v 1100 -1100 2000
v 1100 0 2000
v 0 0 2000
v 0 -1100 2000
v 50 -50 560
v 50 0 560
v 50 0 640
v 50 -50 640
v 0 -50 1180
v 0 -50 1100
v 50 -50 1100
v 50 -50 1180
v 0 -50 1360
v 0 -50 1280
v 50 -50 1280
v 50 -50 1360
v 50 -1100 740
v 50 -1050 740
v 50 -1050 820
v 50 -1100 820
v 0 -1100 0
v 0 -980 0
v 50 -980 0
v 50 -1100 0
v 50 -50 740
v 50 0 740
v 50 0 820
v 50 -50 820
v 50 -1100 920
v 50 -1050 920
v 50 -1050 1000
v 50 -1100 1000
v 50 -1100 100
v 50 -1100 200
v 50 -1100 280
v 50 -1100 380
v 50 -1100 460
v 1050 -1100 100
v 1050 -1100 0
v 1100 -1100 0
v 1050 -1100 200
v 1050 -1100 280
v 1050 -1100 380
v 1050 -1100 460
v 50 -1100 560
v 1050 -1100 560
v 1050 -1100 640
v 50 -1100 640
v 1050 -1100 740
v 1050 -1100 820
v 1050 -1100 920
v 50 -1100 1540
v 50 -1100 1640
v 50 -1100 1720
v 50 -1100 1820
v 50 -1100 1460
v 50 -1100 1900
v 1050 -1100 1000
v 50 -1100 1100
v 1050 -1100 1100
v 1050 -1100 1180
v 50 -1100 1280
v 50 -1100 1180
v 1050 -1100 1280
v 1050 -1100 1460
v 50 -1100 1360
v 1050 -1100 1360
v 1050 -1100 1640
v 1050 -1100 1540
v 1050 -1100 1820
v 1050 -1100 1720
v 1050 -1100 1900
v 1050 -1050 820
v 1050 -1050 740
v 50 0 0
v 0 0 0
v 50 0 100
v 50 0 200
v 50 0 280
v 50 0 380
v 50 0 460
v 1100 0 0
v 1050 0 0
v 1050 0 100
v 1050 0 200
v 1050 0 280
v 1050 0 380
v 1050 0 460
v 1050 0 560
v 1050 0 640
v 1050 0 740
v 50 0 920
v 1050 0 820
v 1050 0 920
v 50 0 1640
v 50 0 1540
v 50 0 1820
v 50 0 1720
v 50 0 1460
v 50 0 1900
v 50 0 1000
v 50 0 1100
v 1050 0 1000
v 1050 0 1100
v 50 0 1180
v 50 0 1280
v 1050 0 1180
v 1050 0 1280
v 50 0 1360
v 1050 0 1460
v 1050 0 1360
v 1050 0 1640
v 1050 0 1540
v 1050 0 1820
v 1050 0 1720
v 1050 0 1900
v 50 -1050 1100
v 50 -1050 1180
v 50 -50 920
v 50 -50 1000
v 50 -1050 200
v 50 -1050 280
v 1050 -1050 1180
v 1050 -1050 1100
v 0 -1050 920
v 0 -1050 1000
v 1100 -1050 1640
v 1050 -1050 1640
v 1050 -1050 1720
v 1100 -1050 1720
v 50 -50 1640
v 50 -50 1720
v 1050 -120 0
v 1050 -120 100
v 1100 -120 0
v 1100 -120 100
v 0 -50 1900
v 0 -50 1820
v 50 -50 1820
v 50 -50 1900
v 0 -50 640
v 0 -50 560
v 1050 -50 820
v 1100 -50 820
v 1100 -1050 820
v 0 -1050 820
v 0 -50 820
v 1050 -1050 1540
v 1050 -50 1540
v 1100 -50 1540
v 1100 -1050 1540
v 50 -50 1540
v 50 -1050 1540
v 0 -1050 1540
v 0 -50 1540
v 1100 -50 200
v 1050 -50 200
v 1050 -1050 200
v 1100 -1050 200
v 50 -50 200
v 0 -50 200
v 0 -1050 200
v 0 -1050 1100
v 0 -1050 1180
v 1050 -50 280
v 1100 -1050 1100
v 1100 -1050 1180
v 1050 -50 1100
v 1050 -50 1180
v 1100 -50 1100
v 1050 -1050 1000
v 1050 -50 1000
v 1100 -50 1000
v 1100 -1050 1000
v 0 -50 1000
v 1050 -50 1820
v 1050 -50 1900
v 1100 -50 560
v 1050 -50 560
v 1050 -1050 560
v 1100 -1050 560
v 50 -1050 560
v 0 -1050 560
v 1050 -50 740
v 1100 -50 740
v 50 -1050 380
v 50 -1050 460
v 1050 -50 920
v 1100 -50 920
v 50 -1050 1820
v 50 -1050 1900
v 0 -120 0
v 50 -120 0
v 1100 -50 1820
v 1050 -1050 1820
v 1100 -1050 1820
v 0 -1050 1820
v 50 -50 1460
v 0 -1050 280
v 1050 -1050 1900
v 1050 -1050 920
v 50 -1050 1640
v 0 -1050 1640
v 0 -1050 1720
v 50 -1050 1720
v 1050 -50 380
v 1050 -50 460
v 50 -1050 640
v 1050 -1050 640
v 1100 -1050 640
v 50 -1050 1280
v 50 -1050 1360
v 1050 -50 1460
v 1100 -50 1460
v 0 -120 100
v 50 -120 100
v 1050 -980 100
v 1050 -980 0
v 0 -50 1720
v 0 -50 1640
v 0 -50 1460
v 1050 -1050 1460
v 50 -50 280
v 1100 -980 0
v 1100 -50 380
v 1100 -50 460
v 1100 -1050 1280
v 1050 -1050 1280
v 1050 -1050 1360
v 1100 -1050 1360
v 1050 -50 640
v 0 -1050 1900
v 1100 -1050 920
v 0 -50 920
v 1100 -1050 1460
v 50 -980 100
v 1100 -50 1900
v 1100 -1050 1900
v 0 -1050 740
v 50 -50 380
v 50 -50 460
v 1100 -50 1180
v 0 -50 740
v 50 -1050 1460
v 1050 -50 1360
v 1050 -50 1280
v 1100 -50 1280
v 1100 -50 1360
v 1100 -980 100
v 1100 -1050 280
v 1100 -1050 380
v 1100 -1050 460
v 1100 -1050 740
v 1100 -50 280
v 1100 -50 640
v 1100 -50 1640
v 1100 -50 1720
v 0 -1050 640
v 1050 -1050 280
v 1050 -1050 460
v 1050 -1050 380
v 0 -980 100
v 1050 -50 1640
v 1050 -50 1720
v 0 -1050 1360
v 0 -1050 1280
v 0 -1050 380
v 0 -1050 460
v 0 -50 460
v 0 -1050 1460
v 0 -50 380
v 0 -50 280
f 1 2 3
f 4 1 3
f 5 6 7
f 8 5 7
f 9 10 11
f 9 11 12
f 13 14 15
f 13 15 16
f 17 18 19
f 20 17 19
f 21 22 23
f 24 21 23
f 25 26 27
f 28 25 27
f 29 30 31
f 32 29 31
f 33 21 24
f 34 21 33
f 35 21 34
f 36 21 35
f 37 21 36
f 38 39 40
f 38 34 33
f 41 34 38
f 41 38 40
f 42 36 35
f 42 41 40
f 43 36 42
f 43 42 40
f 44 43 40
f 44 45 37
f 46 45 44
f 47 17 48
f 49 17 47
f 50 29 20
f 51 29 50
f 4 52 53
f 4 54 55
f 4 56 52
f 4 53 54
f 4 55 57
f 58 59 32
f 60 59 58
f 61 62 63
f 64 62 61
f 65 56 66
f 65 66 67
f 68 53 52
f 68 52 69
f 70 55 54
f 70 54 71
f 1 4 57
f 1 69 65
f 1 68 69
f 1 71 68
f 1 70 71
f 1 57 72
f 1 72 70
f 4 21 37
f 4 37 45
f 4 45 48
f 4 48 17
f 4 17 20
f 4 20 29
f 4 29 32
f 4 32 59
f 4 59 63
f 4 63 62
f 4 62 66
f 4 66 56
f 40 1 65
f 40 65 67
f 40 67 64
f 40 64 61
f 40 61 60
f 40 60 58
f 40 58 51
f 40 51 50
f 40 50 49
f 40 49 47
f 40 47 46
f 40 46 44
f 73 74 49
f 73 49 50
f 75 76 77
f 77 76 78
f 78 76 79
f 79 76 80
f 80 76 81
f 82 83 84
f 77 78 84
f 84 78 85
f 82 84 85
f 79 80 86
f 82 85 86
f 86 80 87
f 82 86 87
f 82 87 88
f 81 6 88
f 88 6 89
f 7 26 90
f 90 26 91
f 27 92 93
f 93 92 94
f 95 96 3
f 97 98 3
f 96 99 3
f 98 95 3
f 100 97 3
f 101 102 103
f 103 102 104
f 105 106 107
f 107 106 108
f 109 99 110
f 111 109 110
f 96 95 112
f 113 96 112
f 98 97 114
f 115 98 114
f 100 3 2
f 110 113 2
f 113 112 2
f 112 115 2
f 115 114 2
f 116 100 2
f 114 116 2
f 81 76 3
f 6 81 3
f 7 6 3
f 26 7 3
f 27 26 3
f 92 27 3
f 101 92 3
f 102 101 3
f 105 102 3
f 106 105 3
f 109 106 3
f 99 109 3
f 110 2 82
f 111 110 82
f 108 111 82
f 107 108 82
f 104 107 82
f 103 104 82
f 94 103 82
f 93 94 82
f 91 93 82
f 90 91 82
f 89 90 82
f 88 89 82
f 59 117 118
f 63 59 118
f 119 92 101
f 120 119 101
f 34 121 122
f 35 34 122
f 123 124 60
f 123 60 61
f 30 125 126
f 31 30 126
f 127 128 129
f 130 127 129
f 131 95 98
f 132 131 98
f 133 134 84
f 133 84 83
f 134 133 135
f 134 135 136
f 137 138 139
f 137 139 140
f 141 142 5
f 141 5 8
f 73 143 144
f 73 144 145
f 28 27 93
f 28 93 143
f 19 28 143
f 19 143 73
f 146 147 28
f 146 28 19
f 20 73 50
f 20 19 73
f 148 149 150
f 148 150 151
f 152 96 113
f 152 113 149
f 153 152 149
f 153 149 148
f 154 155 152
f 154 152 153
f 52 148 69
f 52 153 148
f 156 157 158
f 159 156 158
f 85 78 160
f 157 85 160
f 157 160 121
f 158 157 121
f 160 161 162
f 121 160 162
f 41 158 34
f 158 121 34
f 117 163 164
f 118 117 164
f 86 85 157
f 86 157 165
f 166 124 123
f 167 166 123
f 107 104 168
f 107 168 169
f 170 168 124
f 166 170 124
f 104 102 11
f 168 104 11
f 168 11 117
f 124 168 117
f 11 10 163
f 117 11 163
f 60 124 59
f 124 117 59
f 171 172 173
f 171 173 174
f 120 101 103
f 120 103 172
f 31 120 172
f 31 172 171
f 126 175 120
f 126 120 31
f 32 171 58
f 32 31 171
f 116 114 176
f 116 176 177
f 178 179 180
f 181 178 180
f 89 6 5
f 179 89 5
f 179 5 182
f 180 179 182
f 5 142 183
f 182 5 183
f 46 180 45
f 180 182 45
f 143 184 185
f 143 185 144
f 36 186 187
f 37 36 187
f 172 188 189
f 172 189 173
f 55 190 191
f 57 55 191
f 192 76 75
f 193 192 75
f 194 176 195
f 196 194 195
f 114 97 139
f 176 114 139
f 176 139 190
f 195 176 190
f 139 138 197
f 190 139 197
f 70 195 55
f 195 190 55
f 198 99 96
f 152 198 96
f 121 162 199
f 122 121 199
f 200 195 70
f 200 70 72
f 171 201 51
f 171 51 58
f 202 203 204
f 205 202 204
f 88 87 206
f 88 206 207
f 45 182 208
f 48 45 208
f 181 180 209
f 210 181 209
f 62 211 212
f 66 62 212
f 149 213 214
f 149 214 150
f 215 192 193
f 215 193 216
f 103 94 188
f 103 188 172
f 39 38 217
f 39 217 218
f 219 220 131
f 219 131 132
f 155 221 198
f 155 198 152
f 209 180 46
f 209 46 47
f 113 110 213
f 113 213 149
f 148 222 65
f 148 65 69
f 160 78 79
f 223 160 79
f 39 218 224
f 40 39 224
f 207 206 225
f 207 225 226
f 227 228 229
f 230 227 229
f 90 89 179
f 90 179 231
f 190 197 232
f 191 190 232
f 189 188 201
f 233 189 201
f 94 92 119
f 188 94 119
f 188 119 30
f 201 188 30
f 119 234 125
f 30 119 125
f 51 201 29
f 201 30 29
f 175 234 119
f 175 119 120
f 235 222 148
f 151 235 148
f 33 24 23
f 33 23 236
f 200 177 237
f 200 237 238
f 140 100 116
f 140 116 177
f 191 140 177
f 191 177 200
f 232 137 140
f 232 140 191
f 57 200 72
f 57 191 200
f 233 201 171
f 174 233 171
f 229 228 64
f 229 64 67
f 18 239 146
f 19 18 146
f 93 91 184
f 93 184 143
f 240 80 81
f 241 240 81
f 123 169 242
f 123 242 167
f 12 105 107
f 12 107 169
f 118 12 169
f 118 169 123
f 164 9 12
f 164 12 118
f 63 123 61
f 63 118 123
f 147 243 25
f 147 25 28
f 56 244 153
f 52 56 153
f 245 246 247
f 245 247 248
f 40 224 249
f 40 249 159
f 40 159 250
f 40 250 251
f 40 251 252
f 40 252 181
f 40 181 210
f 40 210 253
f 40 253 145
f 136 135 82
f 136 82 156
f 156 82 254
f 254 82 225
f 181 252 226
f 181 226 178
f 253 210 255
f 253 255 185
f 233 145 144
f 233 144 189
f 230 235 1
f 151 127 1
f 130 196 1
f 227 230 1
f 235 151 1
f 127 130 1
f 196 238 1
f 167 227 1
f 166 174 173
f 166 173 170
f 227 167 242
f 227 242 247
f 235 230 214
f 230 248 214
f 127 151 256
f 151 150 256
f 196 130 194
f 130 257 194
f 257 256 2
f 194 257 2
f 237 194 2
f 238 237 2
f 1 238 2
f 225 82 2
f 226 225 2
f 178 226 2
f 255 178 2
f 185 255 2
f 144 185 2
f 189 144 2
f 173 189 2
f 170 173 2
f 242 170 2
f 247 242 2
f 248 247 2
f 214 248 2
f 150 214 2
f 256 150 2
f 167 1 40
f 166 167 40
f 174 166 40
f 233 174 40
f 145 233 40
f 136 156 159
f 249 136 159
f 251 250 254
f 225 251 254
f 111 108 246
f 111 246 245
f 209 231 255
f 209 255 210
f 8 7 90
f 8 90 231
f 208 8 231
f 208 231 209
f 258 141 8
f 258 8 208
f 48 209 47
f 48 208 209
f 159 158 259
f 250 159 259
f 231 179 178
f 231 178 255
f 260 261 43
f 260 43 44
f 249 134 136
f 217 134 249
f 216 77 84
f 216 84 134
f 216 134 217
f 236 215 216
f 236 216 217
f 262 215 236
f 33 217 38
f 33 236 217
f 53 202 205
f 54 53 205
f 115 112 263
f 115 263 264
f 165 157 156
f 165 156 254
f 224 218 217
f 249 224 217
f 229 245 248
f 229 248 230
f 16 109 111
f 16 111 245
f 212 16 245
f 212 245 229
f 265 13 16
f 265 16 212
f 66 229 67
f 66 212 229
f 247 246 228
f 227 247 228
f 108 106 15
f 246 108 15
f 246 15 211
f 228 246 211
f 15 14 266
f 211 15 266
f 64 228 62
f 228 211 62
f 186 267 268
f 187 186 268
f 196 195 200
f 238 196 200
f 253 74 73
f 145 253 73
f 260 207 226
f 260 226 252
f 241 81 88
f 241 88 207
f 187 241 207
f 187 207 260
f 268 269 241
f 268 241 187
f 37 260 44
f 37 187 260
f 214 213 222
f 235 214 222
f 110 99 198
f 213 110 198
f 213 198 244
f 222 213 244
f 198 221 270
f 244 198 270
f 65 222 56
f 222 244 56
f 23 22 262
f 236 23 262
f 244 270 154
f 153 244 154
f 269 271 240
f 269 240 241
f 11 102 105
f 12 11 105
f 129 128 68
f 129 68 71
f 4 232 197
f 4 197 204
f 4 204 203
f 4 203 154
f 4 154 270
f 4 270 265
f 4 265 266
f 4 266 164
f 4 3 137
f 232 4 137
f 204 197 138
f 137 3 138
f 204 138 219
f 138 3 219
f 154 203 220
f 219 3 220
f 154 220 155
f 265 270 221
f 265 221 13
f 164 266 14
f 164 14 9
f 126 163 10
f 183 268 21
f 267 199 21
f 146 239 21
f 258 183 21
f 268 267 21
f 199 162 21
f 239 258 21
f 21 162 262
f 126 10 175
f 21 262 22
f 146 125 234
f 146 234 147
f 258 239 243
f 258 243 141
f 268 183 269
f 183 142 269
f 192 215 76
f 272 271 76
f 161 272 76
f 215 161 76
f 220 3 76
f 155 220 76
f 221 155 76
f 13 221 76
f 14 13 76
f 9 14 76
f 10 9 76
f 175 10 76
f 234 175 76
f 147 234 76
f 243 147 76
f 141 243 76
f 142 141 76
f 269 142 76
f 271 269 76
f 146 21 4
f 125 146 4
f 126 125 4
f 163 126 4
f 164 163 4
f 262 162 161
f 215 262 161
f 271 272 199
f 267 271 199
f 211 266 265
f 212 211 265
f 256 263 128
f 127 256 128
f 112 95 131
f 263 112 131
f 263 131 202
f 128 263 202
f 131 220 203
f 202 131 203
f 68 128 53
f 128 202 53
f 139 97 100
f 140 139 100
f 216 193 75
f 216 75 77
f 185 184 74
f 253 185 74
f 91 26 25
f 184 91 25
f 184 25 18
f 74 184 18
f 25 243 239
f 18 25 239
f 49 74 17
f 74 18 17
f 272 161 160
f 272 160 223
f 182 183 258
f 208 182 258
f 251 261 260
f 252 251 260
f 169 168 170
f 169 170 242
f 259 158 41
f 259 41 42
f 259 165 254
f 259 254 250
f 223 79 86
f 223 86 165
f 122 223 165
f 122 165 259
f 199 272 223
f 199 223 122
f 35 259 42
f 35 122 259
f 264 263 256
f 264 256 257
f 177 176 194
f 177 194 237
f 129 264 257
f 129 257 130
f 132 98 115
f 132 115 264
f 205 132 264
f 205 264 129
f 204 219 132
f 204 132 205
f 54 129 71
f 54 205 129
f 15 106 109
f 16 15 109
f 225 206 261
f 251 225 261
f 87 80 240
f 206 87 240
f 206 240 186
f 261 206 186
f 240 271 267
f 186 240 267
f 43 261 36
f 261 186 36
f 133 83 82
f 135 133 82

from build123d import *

# Parameters (mm, degrees)
F0_W     = 1000
F0_H     = 80
F1_DEPTH = 1100
F2_W     = 1000
F2_H     = 80
F2_W_2   = 860
F2_H_2   = 100
F3_DEPTH = 1100.001


with BuildPart() as f1:
    # F0 (on Front) → F1 (new body)
    with BuildSketch(Plane.XZ):
        Polygon((0, 2000), (0, 0), (50, 0), (50, 100), (1050, 100), (1050, 0), (1100, 0), (1100, 2000), align=None)
        with Locations((550, 240)):
            Rectangle(F0_W, F0_H, mode=Mode.SUBTRACT)
        with Locations((550, 420)):
            Rectangle(F0_W, F0_H, mode=Mode.SUBTRACT)
        with Locations((550, 600)):
            Rectangle(F0_W, F0_H, mode=Mode.SUBTRACT)
        with Locations((550, 780)):
            Rectangle(F0_W, F0_H, mode=Mode.SUBTRACT)
        with Locations((550, 960)):
            Rectangle(F0_W, F0_H, mode=Mode.SUBTRACT)
        with Locations((550, 1140)):
            Rectangle(F0_W, F0_H, mode=Mode.SUBTRACT)
        with Locations((550, 1320)):
            Rectangle(F0_W, F0_H, mode=Mode.SUBTRACT)
        with Locations((550, 1500)):
            Rectangle(F0_W, F0_H, mode=Mode.SUBTRACT)
        with Locations((550, 1680)):
            Rectangle(F0_W, F0_H, mode=Mode.SUBTRACT)
        with Locations((550, 1860)):
            Rectangle(F0_W, F0_H, mode=Mode.SUBTRACT)
    extrude(amount=F1_DEPTH)

    # F2 (on face) → F3 (cut, through all)
    with BuildSketch(Plane(origin=(0, 0, 0), x_dir=(0, -1, 0), z_dir=(-1, 0, 0))):
        with Locations((550, 1860)):
            Rectangle(F2_W, F2_H)
        with Locations((550, 1680)):
            Rectangle(F2_W, F2_H)
        with Locations((550, 1500)):
            Rectangle(F2_W, F2_H)
        with Locations((550, 1320)):
            Rectangle(F2_W, F2_H)
        with Locations((550, 1140)):
            Rectangle(F2_W, F2_H)
        with Locations((550, 960)):
            Rectangle(F2_W, F2_H)
        with Locations((550, 780)):
            Rectangle(F2_W, F2_H)
        with Locations((550, 600)):
            Rectangle(F2_W, F2_H)
        with Locations((550, 420)):
            Rectangle(F2_W, F2_H)
        with Locations((550, 240)):
            Rectangle(F2_W, F2_H)
        with Locations((550, 50)):
            Rectangle(F2_W_2, F2_H_2)
    extrude(amount=-F3_DEPTH, mode=Mode.SUBTRACT)


solid = f1.part
